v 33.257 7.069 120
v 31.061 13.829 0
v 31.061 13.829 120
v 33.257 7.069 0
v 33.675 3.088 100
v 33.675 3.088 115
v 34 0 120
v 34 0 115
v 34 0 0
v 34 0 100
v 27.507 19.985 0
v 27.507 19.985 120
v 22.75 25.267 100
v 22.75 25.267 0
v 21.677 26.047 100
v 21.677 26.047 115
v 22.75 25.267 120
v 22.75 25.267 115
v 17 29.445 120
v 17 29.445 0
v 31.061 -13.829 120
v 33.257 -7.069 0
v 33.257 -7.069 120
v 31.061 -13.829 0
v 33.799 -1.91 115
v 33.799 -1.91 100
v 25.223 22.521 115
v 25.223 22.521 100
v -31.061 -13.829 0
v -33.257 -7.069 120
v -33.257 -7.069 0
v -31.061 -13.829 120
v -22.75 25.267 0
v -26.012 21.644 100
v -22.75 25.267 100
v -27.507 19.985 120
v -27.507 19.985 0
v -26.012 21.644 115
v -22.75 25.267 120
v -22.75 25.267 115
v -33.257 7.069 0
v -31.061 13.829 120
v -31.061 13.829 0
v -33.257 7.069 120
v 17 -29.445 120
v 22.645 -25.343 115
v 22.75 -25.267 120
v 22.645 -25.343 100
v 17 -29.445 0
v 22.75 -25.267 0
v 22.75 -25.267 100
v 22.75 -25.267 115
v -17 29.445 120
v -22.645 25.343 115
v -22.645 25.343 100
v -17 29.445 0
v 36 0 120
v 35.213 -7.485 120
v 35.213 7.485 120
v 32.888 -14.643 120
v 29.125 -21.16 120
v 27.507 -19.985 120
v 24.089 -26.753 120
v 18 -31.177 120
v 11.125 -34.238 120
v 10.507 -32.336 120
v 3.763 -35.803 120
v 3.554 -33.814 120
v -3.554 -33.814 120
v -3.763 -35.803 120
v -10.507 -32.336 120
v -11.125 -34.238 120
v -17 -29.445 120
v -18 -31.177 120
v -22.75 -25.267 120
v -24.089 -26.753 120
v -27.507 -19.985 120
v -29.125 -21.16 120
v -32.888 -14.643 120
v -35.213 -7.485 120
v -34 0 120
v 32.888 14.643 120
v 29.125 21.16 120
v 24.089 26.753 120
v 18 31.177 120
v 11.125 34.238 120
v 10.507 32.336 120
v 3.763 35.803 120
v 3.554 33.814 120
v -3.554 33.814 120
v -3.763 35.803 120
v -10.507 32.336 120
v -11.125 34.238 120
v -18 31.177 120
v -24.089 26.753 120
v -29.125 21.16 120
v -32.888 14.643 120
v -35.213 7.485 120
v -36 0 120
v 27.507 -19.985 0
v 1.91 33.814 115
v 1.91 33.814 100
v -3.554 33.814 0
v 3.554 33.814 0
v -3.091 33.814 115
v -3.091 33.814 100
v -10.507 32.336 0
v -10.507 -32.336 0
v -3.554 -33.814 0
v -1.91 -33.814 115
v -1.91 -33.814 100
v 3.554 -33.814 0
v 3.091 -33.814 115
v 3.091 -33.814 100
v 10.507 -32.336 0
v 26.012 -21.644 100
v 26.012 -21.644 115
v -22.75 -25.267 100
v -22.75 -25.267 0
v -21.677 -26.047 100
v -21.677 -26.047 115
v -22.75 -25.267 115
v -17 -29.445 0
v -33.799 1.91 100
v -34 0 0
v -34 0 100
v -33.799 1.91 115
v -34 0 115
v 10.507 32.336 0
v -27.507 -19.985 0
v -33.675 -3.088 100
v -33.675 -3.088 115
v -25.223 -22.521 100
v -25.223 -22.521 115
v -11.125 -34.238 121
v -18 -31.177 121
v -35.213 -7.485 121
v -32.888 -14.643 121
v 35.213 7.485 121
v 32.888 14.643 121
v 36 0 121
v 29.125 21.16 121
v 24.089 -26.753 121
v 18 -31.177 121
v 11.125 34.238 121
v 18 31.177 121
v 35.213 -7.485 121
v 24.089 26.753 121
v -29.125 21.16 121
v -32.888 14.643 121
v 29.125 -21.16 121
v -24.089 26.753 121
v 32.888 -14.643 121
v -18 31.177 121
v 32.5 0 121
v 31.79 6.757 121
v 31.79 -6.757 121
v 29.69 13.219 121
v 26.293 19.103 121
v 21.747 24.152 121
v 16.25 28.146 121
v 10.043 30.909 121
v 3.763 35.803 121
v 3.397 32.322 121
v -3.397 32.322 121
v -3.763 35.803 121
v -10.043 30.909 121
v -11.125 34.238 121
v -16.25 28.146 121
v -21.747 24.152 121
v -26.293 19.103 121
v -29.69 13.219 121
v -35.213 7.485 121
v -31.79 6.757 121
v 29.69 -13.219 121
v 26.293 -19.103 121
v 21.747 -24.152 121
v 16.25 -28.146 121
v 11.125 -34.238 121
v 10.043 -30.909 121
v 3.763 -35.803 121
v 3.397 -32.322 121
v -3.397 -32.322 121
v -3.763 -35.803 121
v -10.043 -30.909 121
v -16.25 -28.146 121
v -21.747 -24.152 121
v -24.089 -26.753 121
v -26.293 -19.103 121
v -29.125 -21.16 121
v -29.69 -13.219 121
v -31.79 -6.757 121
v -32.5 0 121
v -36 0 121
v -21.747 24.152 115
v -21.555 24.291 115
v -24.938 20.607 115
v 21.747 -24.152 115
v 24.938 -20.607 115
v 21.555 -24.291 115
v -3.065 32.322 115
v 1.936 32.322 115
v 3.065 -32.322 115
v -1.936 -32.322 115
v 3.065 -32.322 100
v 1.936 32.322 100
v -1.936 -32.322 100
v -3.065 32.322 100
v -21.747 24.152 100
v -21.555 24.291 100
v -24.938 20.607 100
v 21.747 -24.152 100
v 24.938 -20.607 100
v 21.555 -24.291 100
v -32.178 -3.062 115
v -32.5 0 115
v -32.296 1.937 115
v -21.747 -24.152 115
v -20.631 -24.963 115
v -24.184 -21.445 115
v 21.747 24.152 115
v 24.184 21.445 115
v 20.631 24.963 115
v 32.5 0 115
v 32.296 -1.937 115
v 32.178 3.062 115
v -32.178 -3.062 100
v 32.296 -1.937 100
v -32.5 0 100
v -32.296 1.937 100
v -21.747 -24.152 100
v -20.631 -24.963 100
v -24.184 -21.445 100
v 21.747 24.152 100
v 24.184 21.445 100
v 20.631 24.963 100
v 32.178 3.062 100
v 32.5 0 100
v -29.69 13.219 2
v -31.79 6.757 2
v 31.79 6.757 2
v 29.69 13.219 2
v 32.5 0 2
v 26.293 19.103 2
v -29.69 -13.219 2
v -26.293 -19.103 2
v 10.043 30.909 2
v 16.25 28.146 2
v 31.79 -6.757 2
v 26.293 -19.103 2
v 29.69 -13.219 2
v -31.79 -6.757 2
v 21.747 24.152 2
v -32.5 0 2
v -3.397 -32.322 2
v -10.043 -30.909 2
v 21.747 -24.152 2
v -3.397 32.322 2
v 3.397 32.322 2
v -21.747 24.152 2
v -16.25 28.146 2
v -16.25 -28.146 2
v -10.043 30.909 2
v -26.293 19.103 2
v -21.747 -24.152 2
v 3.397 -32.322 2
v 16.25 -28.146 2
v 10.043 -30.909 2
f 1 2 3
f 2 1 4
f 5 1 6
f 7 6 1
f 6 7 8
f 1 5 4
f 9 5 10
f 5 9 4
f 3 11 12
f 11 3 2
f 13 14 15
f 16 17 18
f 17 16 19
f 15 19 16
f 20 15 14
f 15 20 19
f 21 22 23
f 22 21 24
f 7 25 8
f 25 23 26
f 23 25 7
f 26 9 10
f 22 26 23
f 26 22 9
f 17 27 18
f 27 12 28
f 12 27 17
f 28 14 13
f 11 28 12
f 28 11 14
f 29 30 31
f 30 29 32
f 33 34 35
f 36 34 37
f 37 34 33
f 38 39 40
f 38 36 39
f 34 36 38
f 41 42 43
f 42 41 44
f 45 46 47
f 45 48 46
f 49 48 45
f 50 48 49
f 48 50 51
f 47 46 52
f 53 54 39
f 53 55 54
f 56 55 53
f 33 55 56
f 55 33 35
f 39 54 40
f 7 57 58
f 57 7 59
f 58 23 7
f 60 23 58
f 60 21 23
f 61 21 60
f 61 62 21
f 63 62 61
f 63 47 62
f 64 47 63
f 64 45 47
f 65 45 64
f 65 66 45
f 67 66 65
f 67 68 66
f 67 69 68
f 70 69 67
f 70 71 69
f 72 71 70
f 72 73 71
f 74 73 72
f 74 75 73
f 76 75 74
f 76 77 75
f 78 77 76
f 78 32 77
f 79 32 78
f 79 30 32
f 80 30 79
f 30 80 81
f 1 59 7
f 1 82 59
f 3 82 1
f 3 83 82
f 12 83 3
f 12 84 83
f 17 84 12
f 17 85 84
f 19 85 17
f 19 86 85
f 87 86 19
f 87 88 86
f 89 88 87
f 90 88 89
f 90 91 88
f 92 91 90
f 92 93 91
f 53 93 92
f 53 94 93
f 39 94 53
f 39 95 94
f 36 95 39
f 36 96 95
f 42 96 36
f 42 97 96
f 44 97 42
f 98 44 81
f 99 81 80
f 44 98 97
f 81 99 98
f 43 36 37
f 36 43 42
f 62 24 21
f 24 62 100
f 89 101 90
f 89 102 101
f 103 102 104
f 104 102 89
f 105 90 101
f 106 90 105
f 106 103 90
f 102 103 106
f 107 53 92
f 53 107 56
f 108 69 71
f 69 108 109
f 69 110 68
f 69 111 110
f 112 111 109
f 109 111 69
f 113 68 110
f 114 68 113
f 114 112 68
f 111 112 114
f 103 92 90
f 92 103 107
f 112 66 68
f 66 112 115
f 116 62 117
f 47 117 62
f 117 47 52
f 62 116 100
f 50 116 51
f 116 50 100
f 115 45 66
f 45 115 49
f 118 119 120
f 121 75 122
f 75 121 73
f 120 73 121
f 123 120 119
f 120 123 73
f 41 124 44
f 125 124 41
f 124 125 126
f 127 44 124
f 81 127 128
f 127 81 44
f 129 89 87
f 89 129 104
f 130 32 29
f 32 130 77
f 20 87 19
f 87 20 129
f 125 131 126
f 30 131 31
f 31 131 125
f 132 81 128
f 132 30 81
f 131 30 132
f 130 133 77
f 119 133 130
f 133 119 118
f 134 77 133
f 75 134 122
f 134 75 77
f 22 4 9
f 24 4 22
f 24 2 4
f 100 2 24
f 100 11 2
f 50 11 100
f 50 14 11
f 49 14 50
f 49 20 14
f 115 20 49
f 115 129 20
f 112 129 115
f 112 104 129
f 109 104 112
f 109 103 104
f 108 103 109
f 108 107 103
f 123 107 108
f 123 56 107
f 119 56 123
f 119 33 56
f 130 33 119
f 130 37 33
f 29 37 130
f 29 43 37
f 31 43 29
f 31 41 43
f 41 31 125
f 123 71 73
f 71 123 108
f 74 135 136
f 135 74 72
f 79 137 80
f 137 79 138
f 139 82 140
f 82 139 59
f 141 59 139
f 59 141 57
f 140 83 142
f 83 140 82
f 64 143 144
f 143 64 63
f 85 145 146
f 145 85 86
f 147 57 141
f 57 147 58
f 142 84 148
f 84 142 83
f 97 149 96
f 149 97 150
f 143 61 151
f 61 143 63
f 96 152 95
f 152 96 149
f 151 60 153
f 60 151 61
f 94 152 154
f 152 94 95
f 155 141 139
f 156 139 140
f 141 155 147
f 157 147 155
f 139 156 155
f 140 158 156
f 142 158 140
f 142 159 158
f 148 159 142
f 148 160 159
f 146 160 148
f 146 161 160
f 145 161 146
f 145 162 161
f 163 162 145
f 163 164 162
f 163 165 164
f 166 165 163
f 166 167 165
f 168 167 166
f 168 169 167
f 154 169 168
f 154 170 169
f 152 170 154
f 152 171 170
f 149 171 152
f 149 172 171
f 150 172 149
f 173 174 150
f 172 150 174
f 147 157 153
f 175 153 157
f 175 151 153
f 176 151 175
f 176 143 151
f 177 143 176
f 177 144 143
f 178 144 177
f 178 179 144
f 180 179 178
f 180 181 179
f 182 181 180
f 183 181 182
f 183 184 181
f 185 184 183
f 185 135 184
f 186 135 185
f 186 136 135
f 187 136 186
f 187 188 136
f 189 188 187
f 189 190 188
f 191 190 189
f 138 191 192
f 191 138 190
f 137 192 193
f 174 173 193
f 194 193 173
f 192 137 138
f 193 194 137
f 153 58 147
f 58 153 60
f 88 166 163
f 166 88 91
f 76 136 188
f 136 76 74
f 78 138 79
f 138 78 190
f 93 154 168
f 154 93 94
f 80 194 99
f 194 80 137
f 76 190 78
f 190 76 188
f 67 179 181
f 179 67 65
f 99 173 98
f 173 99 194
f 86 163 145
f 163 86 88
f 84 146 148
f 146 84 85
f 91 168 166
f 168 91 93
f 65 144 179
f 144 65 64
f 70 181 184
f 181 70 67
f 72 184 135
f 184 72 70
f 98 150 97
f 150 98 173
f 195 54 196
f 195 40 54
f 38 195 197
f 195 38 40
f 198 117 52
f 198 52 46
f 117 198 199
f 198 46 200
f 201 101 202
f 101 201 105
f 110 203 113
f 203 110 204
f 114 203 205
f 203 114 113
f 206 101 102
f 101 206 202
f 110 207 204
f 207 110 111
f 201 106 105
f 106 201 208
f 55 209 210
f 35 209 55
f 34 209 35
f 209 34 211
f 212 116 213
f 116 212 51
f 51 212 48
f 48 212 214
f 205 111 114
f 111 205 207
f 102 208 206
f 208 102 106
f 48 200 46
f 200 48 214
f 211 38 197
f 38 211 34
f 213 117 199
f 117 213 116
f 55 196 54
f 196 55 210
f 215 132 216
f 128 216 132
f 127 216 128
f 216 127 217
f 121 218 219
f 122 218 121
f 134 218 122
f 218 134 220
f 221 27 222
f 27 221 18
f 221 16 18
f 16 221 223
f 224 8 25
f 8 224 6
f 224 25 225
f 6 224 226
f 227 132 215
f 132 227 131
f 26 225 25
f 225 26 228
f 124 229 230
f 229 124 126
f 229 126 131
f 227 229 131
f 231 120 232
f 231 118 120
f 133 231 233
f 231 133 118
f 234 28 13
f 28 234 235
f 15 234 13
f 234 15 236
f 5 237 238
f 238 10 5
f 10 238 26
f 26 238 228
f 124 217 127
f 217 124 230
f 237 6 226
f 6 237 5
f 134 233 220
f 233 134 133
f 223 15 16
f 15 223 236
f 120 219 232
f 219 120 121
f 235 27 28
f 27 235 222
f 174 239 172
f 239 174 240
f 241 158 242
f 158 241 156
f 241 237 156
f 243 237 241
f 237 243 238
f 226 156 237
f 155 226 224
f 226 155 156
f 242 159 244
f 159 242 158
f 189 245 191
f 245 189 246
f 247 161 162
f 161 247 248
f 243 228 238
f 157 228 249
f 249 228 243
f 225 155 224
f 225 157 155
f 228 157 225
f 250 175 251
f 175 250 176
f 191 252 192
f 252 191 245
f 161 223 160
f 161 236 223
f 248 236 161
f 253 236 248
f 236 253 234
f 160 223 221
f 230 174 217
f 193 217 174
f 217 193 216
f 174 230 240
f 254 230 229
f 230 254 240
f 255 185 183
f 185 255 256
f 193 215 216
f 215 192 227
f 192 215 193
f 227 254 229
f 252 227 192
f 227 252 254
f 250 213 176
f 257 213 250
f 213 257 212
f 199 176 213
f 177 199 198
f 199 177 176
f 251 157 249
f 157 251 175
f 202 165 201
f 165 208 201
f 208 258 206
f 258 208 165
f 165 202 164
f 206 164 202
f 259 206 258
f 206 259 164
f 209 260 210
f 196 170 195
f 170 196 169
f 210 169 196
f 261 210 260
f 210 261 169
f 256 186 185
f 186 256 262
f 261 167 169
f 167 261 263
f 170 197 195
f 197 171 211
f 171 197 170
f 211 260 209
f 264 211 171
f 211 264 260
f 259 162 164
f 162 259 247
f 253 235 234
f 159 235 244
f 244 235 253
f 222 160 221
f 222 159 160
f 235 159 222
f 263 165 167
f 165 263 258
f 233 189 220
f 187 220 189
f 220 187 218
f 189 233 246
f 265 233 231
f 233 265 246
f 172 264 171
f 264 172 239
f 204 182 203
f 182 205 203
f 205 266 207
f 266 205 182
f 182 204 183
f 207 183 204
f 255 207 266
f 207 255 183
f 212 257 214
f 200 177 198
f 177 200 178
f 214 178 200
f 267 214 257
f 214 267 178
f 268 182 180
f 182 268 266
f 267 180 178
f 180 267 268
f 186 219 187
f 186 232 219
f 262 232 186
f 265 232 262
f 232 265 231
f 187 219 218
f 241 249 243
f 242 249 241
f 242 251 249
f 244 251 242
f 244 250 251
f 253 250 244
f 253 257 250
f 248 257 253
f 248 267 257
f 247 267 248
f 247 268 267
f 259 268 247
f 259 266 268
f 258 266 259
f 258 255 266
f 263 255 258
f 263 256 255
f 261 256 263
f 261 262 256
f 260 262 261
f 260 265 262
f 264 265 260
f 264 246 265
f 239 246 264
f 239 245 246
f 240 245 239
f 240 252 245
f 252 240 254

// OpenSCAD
difference() {
	union() {
		cylinder(h=120, r=34);
		translate([0, 0, 120]) cylinder(h=1, r=36);
	}
	translate([0, 0, 2]) cylinder(h=120, r=32.5);
	for(i = [1:45:180]) {
		rotate(i) translate([-2.5, -50, 100]) cube([5, 100, 15]);
	}
}
